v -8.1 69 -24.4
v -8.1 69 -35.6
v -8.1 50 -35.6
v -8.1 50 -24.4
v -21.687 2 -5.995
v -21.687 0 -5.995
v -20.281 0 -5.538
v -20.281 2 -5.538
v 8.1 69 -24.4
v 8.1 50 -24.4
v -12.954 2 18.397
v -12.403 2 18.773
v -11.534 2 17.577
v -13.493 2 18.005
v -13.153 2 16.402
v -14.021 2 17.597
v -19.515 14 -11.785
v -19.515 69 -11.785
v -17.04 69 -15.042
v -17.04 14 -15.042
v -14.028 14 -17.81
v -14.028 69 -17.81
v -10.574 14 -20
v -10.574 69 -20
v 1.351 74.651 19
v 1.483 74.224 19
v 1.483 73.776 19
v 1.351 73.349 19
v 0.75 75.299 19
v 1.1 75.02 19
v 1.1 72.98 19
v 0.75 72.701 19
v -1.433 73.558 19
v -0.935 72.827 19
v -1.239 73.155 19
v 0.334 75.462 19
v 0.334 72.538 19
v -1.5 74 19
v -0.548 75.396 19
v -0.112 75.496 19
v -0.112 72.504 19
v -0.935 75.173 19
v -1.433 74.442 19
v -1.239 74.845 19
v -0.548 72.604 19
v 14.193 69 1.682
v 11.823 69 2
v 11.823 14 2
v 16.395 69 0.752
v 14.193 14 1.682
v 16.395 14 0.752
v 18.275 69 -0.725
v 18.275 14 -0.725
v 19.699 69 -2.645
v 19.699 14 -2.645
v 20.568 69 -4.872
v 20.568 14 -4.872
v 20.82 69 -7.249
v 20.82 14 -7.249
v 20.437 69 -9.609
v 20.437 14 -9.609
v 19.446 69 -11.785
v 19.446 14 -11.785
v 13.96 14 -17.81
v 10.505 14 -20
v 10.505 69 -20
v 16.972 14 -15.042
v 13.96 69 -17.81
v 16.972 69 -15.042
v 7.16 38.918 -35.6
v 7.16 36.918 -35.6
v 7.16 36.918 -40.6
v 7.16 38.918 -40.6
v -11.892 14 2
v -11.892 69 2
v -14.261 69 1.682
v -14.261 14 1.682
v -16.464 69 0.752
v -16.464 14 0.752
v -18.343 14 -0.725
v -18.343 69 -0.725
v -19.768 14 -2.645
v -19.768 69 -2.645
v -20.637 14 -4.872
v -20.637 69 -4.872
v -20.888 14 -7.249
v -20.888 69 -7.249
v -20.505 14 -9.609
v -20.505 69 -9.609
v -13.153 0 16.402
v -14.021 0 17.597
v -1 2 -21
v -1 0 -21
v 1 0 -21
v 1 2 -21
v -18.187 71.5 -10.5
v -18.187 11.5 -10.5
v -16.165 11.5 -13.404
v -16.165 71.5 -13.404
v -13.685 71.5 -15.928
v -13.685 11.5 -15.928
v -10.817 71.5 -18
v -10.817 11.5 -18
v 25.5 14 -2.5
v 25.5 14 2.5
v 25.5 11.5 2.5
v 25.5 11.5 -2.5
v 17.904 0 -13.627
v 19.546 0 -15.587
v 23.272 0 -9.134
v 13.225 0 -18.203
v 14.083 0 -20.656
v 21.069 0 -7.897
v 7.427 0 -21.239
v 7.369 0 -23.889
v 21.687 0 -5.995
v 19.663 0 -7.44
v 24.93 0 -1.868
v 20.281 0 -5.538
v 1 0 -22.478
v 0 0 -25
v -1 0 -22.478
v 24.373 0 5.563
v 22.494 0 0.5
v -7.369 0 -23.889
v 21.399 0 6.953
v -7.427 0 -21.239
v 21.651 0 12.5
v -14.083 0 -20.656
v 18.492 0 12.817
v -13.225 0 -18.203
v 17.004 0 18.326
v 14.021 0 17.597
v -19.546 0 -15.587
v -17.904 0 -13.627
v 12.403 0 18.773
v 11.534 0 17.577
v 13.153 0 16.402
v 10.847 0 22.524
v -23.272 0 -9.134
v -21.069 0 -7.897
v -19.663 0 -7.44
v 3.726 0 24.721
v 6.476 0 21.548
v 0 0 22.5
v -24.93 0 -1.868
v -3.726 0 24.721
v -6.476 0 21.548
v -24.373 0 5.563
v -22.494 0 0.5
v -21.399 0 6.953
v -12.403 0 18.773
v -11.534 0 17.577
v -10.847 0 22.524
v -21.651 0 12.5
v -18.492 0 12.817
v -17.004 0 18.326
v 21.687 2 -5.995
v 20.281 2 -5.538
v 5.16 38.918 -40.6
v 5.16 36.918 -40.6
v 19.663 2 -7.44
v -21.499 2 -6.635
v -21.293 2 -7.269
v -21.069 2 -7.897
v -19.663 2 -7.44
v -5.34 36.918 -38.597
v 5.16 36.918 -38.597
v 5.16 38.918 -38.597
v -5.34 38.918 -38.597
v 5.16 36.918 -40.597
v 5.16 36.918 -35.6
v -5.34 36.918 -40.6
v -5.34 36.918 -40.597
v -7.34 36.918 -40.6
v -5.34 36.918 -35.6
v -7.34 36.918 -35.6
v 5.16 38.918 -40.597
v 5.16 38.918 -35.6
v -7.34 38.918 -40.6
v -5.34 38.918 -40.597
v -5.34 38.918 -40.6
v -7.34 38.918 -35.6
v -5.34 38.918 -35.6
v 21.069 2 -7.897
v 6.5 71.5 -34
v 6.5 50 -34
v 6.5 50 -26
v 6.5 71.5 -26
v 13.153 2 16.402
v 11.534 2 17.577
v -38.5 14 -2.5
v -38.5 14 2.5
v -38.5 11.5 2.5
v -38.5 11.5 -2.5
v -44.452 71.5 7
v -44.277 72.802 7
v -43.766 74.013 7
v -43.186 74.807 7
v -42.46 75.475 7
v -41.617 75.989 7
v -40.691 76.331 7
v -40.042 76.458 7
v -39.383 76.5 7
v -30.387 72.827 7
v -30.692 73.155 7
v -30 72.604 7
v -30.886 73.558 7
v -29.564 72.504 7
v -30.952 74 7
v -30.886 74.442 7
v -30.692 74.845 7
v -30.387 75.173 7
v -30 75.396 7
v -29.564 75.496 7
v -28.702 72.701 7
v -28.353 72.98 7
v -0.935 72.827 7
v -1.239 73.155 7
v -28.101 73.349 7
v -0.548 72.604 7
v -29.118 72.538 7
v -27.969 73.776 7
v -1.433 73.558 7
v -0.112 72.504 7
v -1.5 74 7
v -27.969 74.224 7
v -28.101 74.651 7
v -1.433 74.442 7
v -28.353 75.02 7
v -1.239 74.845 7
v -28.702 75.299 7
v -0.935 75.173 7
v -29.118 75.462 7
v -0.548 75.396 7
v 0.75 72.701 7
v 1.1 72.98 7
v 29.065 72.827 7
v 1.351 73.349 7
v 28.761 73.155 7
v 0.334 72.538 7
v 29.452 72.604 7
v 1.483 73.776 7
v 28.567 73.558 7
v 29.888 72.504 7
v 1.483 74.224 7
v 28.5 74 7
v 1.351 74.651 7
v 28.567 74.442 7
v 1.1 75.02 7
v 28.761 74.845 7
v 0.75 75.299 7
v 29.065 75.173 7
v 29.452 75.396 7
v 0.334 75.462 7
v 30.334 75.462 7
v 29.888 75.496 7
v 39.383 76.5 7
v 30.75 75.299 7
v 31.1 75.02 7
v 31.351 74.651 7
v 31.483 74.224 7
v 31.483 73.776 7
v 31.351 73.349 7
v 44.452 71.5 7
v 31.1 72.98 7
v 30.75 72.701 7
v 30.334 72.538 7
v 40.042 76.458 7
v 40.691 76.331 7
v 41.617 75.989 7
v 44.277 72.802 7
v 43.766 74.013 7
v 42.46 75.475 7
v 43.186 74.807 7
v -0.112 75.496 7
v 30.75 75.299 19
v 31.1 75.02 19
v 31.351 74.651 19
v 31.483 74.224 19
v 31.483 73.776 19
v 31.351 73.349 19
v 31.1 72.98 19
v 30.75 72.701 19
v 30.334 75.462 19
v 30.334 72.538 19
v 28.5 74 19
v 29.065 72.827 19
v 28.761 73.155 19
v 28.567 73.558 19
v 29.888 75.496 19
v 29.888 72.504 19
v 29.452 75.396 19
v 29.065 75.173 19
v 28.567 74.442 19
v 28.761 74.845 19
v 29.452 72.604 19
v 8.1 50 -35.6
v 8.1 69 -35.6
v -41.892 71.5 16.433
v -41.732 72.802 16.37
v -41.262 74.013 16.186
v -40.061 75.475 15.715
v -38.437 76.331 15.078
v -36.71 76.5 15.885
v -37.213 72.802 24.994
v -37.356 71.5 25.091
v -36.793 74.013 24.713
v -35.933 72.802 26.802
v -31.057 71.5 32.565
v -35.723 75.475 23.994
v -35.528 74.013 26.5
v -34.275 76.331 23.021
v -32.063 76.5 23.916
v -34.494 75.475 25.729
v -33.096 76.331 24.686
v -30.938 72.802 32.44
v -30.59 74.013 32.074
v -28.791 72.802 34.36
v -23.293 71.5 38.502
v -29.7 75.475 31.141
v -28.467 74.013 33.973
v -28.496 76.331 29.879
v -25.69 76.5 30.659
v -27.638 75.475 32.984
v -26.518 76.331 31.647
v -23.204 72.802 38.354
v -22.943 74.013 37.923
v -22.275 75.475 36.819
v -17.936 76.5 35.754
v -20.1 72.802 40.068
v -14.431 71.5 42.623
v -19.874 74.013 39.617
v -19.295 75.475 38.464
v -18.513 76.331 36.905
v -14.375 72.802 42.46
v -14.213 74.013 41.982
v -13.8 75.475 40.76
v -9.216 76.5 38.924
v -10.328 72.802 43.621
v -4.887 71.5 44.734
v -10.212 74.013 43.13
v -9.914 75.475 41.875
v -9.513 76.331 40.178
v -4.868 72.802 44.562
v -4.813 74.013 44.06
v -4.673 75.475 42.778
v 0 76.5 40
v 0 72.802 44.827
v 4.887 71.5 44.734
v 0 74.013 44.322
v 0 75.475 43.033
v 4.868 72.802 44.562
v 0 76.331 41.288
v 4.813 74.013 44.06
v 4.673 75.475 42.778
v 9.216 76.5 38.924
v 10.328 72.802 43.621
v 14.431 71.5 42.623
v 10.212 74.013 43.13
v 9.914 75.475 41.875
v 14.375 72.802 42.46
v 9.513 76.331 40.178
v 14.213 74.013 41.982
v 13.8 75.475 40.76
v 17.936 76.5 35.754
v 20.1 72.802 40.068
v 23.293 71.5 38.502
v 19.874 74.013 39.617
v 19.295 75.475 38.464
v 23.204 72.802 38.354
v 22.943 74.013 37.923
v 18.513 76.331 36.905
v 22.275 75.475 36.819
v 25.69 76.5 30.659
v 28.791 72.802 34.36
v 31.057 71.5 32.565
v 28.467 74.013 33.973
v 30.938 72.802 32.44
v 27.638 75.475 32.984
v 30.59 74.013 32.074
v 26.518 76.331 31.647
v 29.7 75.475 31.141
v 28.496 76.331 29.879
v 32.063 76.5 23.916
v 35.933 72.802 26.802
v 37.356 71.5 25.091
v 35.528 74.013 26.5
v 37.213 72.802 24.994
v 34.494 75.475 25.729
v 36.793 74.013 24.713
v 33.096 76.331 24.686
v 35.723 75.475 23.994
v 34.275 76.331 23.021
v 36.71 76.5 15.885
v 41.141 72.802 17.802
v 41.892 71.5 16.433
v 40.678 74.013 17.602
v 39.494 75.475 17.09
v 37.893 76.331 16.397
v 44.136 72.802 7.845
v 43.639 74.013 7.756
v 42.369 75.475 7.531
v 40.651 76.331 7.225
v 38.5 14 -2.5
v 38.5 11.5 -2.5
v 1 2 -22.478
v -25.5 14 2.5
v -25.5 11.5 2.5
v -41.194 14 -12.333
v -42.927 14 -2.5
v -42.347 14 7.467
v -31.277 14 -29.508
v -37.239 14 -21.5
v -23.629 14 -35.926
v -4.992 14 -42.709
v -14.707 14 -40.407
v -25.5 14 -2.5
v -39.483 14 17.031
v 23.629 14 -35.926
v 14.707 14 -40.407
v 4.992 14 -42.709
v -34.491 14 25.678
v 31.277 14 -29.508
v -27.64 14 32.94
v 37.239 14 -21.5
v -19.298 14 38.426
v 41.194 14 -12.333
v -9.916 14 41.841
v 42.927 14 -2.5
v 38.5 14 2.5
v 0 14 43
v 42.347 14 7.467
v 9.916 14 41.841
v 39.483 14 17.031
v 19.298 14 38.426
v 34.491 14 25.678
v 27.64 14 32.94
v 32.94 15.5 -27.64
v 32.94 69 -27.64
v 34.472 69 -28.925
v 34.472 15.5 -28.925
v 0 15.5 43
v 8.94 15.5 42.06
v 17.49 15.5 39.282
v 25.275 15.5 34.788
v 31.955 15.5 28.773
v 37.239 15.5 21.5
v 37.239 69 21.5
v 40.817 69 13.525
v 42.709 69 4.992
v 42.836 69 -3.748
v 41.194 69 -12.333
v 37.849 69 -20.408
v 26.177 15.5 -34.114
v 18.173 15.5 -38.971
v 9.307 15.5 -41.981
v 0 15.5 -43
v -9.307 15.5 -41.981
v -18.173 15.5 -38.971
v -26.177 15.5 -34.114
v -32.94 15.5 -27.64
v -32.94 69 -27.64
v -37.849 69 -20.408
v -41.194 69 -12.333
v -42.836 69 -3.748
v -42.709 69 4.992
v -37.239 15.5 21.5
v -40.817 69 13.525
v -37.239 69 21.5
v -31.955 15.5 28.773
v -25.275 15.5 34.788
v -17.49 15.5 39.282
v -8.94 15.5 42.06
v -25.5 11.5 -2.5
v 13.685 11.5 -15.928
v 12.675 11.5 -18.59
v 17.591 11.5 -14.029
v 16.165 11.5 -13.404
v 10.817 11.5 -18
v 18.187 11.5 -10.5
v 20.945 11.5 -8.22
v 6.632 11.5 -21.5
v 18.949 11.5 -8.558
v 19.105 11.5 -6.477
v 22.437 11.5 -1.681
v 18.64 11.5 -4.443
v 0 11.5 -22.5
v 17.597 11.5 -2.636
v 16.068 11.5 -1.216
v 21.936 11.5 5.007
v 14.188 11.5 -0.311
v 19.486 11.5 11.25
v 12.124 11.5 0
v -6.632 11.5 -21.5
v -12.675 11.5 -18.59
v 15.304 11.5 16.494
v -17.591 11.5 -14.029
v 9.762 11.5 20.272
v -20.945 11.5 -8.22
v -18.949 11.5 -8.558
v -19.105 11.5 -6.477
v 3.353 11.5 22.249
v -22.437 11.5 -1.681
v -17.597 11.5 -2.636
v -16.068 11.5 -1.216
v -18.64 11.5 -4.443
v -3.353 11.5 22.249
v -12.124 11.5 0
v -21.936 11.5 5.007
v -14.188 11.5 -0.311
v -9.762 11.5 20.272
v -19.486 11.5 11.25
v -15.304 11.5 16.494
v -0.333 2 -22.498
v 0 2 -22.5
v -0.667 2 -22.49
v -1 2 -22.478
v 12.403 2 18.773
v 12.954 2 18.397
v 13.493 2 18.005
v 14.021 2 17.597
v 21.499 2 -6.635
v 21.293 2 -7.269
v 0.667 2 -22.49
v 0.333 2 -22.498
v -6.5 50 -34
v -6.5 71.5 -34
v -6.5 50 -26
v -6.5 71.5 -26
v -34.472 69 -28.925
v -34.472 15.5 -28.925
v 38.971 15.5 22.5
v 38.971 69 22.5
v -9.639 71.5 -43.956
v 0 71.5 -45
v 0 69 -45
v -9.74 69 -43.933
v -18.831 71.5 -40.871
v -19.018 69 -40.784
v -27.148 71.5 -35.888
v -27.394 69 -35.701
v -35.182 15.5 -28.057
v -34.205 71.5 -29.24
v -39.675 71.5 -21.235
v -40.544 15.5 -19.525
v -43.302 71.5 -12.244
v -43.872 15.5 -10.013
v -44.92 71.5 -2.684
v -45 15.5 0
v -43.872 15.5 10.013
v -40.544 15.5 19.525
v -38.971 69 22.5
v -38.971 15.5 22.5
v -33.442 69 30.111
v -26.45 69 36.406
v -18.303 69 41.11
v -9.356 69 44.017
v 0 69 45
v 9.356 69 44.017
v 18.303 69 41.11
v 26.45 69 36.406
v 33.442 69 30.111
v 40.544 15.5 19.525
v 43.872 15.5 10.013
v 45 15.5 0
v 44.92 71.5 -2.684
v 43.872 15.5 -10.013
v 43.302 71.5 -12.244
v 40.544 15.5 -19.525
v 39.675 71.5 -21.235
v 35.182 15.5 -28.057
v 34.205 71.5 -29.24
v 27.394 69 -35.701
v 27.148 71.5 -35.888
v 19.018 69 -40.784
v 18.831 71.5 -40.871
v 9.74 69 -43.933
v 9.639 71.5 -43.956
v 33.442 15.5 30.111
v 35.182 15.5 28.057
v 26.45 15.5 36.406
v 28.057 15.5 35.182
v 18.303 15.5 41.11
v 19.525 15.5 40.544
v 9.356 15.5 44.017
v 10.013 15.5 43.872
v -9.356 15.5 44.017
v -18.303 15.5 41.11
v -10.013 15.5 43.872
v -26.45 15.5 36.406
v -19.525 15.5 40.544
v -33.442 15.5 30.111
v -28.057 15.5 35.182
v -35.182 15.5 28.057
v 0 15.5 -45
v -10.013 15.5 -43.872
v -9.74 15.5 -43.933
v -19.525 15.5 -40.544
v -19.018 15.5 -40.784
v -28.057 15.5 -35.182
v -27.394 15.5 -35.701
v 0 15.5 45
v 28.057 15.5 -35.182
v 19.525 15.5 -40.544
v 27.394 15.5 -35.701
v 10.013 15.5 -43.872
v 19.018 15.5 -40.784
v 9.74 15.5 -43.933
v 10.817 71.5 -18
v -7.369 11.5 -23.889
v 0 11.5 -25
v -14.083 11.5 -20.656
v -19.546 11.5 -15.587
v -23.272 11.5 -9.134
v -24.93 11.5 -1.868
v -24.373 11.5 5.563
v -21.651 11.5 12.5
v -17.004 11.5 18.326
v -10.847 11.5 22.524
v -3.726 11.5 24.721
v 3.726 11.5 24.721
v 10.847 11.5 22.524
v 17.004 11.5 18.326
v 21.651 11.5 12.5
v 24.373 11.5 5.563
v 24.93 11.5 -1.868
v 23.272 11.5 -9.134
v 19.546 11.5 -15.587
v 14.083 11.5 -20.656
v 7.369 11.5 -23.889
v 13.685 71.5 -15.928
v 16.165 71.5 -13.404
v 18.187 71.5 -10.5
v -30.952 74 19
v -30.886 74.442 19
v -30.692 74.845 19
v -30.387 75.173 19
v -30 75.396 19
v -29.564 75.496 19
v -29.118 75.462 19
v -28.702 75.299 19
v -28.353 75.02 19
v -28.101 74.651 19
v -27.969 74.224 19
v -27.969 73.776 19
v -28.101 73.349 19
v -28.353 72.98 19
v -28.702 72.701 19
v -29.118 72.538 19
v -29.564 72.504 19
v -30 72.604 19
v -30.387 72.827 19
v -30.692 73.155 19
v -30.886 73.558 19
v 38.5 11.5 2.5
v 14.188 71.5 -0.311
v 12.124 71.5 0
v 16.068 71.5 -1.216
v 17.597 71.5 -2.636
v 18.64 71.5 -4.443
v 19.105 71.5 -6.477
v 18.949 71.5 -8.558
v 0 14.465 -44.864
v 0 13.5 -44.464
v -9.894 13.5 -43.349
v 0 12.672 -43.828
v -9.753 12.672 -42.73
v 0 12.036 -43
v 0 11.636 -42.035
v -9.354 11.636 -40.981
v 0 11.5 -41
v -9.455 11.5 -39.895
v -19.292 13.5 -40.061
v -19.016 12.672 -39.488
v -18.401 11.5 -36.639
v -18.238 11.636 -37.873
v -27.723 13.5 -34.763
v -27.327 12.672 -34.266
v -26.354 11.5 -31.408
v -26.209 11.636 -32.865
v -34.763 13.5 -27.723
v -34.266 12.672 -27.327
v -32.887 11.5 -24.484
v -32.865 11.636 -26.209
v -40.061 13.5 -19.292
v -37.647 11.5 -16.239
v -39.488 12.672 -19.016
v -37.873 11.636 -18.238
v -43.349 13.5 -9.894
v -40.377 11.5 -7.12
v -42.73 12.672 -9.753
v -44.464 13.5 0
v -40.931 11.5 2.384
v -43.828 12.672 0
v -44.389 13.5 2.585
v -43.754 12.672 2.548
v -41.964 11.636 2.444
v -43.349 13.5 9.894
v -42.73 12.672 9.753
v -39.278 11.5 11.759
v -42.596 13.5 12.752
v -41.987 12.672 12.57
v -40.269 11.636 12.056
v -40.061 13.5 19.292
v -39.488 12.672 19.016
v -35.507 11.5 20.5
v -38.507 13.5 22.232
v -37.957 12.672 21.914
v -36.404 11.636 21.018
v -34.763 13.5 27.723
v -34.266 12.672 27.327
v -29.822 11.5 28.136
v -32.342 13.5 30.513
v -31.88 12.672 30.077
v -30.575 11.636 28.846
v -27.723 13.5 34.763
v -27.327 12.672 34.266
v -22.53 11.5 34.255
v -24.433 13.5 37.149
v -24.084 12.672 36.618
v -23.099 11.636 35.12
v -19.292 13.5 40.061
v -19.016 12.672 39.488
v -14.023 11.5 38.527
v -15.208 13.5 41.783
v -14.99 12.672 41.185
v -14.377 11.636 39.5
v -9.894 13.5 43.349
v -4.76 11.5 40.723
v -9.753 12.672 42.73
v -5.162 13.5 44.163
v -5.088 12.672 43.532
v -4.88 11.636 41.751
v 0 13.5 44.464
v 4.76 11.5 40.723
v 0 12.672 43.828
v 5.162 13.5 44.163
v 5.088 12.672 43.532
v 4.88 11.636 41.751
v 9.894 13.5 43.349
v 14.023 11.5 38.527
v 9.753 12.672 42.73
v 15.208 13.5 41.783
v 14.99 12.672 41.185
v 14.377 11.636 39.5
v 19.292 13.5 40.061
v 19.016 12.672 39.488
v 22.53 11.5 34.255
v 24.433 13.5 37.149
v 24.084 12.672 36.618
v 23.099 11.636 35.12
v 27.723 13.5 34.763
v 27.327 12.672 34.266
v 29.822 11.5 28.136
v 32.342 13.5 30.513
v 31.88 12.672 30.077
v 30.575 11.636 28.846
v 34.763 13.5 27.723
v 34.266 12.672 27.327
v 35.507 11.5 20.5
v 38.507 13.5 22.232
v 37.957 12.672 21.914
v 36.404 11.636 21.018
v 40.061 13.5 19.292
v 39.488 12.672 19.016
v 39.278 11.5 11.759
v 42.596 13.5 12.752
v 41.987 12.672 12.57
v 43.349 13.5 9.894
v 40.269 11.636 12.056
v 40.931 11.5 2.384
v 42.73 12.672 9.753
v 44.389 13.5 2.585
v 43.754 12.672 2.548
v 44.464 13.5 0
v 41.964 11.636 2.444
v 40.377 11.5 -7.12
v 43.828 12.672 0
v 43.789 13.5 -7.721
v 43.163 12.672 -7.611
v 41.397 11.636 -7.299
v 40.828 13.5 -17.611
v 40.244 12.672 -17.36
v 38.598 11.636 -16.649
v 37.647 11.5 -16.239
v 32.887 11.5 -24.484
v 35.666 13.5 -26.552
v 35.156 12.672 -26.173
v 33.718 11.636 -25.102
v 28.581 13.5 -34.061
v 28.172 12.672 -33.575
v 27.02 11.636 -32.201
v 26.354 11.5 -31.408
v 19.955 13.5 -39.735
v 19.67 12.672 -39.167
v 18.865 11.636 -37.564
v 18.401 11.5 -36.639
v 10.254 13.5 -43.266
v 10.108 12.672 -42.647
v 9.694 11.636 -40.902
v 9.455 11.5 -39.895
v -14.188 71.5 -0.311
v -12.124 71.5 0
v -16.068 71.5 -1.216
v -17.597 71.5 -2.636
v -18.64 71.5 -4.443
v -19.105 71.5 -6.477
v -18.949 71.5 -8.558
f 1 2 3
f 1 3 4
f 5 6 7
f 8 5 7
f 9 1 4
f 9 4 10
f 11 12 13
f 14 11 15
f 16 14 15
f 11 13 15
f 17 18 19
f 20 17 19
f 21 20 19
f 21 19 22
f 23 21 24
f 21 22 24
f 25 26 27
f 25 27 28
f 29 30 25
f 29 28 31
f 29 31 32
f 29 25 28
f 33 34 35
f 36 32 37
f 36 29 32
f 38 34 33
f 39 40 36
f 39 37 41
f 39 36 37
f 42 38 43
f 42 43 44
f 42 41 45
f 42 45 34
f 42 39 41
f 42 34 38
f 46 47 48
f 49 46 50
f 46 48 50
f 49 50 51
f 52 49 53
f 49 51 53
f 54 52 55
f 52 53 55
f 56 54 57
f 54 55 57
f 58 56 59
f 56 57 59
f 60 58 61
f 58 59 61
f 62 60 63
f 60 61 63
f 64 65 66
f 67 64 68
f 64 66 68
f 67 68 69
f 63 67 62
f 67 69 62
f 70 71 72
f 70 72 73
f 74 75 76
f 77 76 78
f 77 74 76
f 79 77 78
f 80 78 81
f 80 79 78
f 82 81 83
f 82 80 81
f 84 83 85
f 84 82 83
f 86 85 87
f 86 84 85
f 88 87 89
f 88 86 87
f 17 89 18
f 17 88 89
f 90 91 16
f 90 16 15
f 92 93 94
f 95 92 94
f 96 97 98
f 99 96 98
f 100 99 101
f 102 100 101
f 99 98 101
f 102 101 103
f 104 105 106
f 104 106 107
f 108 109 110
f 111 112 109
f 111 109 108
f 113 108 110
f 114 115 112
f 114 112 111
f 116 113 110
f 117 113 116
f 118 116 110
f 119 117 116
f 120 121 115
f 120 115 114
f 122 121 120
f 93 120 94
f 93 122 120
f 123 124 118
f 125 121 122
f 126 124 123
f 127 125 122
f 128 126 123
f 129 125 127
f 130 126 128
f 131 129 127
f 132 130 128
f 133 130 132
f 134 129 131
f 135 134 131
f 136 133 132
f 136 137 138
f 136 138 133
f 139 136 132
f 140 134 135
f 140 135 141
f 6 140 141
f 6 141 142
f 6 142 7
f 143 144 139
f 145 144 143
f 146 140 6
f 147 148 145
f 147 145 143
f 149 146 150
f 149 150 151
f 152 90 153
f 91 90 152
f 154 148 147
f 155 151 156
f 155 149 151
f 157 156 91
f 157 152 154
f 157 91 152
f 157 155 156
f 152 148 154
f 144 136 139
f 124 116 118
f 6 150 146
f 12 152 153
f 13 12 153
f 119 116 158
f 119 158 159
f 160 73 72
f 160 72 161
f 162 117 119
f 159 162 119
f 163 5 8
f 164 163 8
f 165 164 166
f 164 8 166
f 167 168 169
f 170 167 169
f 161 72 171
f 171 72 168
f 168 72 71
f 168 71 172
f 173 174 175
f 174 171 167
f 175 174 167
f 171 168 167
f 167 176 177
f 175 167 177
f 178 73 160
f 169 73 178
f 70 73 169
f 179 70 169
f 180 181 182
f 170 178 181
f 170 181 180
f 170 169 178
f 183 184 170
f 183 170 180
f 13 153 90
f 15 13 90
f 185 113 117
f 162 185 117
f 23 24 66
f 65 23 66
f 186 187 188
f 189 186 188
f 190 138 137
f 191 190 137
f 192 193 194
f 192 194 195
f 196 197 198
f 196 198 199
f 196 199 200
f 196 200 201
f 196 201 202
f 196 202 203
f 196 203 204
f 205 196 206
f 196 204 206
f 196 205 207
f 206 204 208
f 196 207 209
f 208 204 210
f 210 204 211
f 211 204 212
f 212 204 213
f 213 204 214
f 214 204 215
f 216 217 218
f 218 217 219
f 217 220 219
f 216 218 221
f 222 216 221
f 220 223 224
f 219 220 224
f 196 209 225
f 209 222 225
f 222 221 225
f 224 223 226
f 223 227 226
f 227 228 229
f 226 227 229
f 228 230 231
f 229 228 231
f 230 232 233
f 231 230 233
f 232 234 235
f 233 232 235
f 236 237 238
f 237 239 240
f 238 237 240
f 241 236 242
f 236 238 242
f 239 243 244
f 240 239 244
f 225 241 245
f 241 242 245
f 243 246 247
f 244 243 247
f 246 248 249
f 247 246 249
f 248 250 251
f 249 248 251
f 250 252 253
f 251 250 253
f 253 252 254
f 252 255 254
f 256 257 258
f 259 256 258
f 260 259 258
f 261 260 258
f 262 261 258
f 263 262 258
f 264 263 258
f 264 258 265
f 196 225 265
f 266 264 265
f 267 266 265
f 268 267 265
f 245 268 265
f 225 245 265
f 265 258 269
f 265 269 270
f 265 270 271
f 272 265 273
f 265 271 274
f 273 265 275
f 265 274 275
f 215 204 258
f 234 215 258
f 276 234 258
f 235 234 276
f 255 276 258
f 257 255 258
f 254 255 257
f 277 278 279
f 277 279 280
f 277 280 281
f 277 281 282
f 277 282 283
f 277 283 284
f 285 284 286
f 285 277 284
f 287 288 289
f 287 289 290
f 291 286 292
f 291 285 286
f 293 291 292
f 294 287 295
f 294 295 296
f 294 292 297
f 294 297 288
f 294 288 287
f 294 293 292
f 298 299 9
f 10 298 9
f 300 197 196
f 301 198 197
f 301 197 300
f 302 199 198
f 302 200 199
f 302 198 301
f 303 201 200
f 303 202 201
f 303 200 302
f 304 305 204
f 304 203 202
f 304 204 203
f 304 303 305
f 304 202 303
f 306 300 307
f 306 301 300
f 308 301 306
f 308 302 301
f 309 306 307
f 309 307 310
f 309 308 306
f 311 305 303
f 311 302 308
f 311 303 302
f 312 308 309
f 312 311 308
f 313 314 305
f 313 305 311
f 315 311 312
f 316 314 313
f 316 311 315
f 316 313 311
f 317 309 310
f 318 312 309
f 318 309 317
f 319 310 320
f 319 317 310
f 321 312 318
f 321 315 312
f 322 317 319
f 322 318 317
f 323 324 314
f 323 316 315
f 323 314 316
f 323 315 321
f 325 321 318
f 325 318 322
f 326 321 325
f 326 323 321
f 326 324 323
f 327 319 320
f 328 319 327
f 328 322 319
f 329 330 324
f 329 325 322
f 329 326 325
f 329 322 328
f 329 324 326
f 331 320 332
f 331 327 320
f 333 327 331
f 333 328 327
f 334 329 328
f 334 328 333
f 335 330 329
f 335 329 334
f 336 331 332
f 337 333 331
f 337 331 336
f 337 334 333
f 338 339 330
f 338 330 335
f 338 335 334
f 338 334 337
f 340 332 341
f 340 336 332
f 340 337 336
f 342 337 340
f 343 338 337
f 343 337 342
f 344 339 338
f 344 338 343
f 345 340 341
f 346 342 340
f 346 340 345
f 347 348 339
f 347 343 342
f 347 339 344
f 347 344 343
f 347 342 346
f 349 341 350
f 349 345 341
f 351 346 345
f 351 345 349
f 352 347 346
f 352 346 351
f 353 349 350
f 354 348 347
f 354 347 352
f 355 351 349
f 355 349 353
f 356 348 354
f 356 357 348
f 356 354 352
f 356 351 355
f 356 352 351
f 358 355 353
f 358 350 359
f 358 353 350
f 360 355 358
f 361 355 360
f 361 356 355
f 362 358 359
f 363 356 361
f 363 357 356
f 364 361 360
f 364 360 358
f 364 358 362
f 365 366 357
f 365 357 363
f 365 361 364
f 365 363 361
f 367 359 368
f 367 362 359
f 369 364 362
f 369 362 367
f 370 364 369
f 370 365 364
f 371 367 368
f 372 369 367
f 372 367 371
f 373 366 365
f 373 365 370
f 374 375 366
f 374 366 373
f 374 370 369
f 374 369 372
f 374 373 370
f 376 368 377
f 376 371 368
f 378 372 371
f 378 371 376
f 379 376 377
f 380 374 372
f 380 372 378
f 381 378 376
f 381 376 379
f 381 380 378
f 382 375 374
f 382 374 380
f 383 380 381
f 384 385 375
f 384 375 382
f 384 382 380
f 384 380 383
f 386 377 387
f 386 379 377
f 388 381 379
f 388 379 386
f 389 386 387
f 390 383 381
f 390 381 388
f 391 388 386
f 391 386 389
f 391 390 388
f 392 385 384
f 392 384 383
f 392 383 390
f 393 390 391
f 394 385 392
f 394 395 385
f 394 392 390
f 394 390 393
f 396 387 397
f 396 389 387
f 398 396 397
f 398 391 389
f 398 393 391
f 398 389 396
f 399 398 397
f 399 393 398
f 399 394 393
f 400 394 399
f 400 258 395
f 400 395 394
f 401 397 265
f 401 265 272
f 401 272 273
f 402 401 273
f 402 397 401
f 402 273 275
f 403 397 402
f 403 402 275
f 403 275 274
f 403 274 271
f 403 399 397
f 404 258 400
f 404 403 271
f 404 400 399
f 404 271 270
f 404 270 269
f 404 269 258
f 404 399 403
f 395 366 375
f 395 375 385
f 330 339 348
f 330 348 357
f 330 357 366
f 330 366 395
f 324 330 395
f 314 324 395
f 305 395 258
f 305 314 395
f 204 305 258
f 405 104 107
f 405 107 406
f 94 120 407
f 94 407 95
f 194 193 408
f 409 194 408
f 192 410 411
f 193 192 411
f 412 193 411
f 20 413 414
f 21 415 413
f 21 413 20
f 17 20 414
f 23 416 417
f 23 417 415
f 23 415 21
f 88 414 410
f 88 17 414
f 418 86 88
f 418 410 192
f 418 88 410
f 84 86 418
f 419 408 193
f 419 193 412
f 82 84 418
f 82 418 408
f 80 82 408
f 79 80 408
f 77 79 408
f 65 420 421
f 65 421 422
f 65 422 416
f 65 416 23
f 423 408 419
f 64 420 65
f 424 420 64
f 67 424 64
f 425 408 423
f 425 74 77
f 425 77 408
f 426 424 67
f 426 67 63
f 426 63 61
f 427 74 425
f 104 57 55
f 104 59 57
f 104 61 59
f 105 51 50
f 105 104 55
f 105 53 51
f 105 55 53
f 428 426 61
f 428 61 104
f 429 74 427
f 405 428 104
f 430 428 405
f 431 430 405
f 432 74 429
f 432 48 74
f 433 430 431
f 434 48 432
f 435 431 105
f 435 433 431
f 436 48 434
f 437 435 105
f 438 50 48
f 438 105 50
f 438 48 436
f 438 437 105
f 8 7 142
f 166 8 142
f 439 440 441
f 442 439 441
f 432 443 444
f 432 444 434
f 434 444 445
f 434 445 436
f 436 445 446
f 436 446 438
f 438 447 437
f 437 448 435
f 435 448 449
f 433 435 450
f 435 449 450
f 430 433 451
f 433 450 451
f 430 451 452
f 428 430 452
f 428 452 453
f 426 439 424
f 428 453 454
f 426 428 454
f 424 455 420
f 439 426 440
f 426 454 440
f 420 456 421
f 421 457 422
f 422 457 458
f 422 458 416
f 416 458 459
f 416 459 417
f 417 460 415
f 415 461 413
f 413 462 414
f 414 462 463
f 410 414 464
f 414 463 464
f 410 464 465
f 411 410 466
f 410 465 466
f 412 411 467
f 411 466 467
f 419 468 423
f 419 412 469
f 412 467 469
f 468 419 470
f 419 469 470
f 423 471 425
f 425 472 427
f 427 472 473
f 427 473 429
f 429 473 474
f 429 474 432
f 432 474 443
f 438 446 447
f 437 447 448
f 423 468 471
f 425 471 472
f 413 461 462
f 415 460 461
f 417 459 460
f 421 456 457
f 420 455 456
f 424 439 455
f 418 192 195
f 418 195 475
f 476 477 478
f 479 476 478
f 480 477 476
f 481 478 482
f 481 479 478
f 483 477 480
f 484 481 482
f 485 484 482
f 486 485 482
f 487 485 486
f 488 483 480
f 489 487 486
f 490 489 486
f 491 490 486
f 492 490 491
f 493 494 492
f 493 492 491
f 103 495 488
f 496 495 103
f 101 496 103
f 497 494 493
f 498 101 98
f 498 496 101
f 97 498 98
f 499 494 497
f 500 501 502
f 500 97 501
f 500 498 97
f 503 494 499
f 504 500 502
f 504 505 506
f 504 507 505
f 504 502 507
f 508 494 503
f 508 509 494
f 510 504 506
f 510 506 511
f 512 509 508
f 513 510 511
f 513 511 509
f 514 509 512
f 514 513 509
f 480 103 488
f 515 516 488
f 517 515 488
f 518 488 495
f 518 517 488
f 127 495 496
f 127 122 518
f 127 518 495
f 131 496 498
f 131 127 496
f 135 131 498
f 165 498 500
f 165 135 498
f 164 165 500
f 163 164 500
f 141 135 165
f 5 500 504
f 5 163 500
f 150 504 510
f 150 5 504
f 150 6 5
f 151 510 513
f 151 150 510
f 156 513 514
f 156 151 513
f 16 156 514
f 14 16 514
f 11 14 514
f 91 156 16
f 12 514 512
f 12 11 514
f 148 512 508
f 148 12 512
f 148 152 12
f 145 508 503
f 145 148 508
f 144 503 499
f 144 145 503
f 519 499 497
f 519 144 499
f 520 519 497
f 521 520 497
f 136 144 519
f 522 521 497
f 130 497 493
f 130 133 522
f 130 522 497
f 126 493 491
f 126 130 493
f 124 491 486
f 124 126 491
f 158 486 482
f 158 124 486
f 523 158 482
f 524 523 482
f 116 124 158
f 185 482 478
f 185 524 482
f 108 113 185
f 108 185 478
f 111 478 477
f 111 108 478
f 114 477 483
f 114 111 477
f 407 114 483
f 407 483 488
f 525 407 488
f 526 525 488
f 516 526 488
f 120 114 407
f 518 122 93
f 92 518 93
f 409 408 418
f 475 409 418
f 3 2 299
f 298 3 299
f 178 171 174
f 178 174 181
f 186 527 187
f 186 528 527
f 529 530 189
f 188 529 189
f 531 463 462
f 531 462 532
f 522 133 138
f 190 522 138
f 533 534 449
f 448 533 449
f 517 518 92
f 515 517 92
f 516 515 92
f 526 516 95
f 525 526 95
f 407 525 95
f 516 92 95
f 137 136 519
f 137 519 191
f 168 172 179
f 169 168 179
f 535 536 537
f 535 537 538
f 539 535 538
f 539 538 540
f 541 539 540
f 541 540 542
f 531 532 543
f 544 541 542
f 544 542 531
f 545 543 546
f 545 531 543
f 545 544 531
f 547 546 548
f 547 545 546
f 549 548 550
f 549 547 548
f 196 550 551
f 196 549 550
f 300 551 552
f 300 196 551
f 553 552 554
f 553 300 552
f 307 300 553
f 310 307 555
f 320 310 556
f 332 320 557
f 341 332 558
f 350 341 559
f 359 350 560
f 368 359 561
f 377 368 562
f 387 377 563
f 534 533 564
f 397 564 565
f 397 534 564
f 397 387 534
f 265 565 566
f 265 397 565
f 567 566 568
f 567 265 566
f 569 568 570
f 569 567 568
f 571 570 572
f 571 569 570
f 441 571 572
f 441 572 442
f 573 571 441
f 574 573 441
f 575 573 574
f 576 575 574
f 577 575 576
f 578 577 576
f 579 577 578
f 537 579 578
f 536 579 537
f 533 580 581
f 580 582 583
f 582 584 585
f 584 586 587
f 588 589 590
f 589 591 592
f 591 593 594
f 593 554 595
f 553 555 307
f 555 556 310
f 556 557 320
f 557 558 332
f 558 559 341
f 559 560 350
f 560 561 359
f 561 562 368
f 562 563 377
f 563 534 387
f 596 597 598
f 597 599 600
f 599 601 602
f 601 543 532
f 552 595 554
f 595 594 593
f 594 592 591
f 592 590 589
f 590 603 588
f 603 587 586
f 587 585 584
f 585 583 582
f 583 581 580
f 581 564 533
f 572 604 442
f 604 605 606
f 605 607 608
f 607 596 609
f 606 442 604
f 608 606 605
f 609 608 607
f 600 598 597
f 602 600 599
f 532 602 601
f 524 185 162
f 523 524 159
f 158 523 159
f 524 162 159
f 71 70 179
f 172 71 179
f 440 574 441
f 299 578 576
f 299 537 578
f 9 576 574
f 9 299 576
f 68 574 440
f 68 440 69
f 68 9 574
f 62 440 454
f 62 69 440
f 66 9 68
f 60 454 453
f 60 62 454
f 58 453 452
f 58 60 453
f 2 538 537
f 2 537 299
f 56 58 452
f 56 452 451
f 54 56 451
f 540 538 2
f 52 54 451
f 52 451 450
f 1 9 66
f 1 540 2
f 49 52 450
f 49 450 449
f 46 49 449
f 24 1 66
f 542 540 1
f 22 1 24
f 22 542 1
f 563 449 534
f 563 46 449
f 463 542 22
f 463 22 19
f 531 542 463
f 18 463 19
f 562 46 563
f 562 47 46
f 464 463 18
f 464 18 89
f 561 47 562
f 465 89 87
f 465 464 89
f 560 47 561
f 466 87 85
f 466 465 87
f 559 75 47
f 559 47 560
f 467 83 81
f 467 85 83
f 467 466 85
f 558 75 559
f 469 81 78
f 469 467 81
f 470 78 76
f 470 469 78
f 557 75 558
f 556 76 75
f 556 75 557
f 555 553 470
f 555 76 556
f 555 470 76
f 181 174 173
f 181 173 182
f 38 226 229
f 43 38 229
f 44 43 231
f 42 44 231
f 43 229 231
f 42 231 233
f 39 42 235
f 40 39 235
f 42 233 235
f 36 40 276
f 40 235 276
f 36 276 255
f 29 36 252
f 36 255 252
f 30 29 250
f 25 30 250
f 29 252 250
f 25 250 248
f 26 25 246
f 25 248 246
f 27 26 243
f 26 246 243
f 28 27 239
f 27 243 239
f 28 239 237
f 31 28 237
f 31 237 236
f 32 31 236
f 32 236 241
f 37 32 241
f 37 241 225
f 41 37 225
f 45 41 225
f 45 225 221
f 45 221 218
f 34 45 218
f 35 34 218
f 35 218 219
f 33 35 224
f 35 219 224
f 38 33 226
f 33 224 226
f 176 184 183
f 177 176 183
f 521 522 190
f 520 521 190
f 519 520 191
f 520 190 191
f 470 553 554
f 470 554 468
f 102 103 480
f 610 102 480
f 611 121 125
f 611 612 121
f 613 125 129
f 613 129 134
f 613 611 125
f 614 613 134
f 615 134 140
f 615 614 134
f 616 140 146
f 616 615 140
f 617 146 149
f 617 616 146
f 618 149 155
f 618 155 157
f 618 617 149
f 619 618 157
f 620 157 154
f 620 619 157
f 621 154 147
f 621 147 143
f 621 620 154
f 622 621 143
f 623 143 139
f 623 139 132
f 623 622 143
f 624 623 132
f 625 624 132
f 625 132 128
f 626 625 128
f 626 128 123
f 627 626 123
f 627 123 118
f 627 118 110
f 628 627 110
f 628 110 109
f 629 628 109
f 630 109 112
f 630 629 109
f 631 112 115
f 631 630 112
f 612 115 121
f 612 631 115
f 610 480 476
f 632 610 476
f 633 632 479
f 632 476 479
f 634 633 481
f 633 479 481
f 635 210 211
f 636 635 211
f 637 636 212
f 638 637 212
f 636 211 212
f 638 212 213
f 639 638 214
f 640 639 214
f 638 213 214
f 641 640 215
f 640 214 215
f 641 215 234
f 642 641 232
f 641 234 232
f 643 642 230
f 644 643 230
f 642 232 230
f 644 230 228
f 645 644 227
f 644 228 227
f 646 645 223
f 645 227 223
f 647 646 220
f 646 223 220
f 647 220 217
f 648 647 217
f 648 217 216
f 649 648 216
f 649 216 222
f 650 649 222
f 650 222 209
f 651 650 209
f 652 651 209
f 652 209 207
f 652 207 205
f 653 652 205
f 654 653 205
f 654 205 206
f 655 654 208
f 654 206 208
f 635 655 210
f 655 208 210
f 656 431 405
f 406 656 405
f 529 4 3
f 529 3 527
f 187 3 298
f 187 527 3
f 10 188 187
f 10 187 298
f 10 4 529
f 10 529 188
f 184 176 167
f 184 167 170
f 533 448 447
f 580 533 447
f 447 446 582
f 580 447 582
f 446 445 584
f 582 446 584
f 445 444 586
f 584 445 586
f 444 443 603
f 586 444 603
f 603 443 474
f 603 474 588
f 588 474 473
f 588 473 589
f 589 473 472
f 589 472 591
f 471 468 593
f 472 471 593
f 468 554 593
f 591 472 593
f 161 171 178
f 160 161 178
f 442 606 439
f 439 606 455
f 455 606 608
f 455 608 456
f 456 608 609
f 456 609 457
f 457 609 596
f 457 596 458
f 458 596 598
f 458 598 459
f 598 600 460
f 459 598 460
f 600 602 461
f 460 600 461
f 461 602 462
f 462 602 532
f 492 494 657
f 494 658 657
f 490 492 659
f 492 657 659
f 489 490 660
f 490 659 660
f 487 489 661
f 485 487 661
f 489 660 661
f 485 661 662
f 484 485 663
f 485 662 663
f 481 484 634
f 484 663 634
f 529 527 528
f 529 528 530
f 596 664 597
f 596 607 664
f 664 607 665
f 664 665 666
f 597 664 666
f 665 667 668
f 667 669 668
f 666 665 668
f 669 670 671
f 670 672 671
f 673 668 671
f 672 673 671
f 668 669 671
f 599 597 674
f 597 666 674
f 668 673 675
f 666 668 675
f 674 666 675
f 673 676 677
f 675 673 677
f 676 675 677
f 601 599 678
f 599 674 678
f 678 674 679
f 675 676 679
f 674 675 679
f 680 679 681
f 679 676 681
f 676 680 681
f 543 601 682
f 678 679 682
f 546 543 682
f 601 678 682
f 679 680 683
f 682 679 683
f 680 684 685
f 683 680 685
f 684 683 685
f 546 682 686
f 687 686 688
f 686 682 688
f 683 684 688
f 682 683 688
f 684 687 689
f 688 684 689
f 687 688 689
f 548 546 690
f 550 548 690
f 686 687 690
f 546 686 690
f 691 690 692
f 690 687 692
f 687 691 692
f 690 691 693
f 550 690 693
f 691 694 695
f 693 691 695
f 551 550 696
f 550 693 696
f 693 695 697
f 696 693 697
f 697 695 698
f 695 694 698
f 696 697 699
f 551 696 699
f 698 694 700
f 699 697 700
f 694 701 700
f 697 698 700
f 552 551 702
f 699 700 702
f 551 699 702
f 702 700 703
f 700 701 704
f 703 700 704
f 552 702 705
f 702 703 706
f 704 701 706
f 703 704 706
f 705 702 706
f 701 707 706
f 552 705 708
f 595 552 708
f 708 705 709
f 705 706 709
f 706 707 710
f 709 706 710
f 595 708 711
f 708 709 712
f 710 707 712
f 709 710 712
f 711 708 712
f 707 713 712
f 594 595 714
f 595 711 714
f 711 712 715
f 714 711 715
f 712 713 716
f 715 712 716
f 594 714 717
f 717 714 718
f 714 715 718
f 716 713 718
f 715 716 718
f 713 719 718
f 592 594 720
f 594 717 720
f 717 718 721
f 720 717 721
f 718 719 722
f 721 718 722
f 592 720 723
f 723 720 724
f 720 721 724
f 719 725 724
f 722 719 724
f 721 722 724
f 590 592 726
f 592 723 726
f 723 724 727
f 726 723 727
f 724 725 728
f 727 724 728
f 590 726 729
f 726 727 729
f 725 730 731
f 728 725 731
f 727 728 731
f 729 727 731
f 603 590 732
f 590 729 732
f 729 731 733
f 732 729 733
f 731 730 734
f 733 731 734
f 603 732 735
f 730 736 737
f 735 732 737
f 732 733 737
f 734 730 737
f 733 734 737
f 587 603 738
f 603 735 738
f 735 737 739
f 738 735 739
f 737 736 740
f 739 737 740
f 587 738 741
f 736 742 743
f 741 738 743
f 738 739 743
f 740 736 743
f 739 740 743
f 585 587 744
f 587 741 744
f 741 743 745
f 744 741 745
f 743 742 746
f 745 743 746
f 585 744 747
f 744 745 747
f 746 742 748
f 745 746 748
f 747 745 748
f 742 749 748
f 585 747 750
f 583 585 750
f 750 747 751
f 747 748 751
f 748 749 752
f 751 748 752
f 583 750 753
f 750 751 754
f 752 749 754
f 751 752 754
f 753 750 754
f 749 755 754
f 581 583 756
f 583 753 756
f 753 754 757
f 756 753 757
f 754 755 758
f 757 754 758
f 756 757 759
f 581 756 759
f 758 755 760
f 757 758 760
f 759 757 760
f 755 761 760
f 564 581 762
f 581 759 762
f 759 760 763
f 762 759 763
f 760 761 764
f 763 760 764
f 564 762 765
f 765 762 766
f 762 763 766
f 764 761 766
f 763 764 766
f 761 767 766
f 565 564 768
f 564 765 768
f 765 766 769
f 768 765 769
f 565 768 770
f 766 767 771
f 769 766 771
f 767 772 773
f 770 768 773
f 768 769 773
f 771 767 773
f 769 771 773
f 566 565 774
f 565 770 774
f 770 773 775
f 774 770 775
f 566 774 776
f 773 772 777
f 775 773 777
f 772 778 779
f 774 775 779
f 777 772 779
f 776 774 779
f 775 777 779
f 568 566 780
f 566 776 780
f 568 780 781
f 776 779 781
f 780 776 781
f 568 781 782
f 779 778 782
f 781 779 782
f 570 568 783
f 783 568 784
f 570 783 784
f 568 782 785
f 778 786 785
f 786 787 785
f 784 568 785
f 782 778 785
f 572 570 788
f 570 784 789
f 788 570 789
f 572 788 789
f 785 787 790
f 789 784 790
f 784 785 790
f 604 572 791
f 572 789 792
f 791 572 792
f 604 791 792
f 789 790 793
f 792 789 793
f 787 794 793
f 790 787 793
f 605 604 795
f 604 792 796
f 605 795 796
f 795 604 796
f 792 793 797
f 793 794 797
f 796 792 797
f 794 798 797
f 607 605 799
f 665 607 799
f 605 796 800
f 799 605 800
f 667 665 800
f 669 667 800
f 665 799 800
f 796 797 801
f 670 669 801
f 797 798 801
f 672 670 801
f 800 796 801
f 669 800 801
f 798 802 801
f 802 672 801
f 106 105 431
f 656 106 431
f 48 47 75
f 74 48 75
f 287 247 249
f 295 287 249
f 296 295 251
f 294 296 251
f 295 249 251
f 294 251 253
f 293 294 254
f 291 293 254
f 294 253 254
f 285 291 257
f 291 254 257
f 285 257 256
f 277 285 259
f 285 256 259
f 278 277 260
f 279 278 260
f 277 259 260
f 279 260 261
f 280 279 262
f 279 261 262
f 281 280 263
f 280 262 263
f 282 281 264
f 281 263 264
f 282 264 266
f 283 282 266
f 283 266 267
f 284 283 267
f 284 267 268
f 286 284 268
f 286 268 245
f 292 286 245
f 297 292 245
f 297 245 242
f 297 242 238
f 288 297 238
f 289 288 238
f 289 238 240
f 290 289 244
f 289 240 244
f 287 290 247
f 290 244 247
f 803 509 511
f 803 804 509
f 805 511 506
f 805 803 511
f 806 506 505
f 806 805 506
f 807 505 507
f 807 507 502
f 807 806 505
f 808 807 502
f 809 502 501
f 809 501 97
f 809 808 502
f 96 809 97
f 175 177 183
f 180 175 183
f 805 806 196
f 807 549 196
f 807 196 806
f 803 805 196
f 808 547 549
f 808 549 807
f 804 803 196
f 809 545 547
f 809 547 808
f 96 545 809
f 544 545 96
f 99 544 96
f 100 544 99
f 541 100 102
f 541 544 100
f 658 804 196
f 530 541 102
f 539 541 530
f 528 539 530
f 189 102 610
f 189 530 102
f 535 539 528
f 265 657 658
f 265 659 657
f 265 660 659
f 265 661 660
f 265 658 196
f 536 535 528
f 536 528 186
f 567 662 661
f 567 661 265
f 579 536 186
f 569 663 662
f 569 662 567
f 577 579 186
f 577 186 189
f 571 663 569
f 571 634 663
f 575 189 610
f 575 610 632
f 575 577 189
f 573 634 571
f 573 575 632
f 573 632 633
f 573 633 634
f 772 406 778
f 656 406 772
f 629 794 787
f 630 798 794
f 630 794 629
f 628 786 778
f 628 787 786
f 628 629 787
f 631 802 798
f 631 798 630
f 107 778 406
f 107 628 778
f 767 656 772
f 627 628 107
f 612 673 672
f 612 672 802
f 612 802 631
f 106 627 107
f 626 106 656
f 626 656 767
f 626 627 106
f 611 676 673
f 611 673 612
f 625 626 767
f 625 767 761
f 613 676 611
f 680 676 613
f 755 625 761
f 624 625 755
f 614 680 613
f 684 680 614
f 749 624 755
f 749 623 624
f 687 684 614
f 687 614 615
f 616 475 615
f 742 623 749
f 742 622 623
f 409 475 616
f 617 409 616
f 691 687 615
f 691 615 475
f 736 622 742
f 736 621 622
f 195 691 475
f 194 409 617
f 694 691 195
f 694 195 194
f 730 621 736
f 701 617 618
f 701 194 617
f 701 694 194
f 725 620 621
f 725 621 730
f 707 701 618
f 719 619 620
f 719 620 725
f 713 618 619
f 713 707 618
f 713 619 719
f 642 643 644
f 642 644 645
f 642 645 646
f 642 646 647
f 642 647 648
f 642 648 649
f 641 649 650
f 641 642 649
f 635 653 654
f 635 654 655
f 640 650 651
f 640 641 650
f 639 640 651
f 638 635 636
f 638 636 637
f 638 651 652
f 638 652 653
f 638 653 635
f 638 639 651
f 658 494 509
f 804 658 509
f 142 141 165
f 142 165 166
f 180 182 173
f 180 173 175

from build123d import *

# Parameters (mm, degrees)
CUT_EXTRUDE1_DEPTH           = 5
CUT_EXTRUDE3_DEPTH           = 60
SKETCH8_R                    = 43
CUT_EXTRUDE4_DEPTH           = 55
FILLET1_R                    = 7
SKETCH12_W                   = 6.5
SKETCH12_H                   = 53.5
CUT_REVOLVE1_ANGLE           = 60
CUT_REVOLVE1_OTHER_WAY_ANGLE = 60
SKETCH18_W                   = 13
SKETCH18_H                   = 8
CUT_EXTRUDE13_DEPTH          = 5
SKETCH20_W                   = 100
SKETCH20_H                   = 7
CUT_EXTRUDE15_DEPTH          = 5
SKETCH19_R                   = 1.5
CUT_EXTRUDE14_DEPTH          = 12
FILLET3_R                    = 4
SKETCH24_W                   = 2
SKETCH24_H                   = 3
BOSS_EXTRUDE3_DEPTH          = 2
CIRPATTERN2_COUNT            = 5
SKETCH26_W                   = 5
SKETCH26_H                   = 53.5
CUT_REVOLVE2_ANGLE           = 50
CUT_REVOLVE2_OTHER_WAY_ANGLE = 50
SKETCH29_W                   = 16.2
SKETCH29_H                   = 11.2
SKETCH29_W_2                 = 13
SKETCH29_H_2                 = 8
BOSS_EXTRUDE4_DEPTH          = 19
SKETCH36_W                   = 2
SKETCH36_H                   = 2
BOSS_EXTRUDE7_DEPTH          = 5
SKETCH37_W                   = 2
SKETCH37_H                   = 2
BOSS_EXTRUDE8_DEPTH          = 12.5
SKETCH40_W                   = 2
SKETCH40_H                   = 2
BOSS_EXTRUDE9_DEPTH          = 5
FILLET8_R                    = 9
SKETCH50_W                   = 13
SKETCH50_H                   = 5
CUT_EXTRUDE23_DEPTH          = 7


with BuildPart() as part:
    # Sketch1 → Revolve1 (revolve)
    with BuildSketch(Plane.XY, mode=Mode.PRIVATE) as revolve1_sk:
        with BuildLine():
            Line((0, 76.5), (0, 11.5))
            Line((0, 11.5), (22.5, 11.5))
            Line((22.5, 11.5), (22.5, 0))
            Line((22.5, 0), (25, 0))
            Line((25, 0), (25, 11.5))
            Line((25, 11.5), (45, 11.5))
            Line((45, 11.5), (45, 71.5))
            ThreePointArc((45, 71.5), (43.535533906, 75.035533906), (40, 76.5))
            Line((40, 76.5), (0, 76.5))
        make_face()
    revolve(revolve1_sk.sketch.rotate(Axis((0, 2, 0), (0, 1, 0)), 90), axis=Axis((0, 2, 0), (0, 1, 0)))

    # Sketch5 → Cut-Extrude1 (cut)
    with BuildSketch(Plane(origin=(0, 76.5, 0), x_dir=(1, 0, 0), z_dir=(0, 1, 0))):
        with BuildLine():
            Line((-45, 0), (45, 0))
            ThreePointArc((45, 0), (0, 45), (-45, 0))
        make_face()
    extrude(amount=-CUT_EXTRUDE1_DEPTH, mode=Mode.SUBTRACT)

    # Sketch7 → Cut-Extrude3 (cut)
    with BuildSketch(Plane.XZ.offset(-11.5)):
        with BuildLine():
            Line((21, 0), (-21, 0))
            ThreePointArc((-21, 0), (-18.277714988, -10.340461055), (-10.816653826, -18))
            Line((-10.816653826, -18), (10.816653826, -18))
            ThreePointArc((10.816653826, -18), (18.277714988, -10.340461055), (21, 0))
        make_face()
    extrude(amount=-CUT_EXTRUDE3_DEPTH, mode=Mode.SUBTRACT)

    # Sketch8 → Cut-Extrude4 (cut)
    with BuildSketch(Plane(origin=(0, 69, 0), x_dir=(1, 0, 0), z_dir=(0, 1, 0))):
        with Locations(Location((0, 0, 0), (0, 0, 270))):
            Circle(SKETCH8_R)
        with BuildLine():
            Line((22.912878475, -2), (-22.981606036, -2))
            ThreePointArc((-22.981606036, -2), (-20.067855169, 10.855581536), (-10.573881727, 20))
            Line((-10.573881727, 20), (10.505154166, 20))
            ThreePointArc((10.505154166, 20), (19.999127608, 10.855581536), (22.912878475, -2))
        make_face(mode=Mode.SUBTRACT)
    extrude(amount=-CUT_EXTRUDE4_DEPTH, mode=Mode.SUBTRACT)

    # Fillet1
    fillet1_edges = [part.edges().sort_by_distance(p)[0] for p in [
        (-21, 41.5, 0),
        (21, 41.5, 0),
    ]]
    fillet(fillet1_edges, radius=FILLET1_R)

    # Sketch12 → Cut-Revolve1 (revolve, cut)
    with BuildSketch(Plane(origin=(0, 0, 0), x_dir=(0, 0, -1), z_dir=(1, 0, 0))):
        with Locations((-44.75, 42.25)):
            Rectangle(SKETCH12_W, SKETCH12_H)
    revolve(axis=Axis((0, 71.5, 0), (0, -1, 0)), revolution_arc=CUT_REVOLVE1_ANGLE, mode=Mode.SUBTRACT)

    # Sketch12 → Cut-Revolve1 other way (revolve, cut)
    with BuildSketch(Plane(origin=(0, 0, 0), x_dir=(0, 0, -1), z_dir=(1, 0, 0))):
        with Locations((-44.75, 42.25)):
            Rectangle(SKETCH12_W, SKETCH12_H)
    revolve(axis=Axis((0, 71.5, 0), (0, 1, 0)), revolution_arc=CUT_REVOLVE1_OTHER_WAY_ANGLE, mode=Mode.SUBTRACT)

    # Sketch18 → Cut-Extrude13 (cut)
    with BuildSketch(Plane(origin=(0, 71.5, 0), x_dir=(1, 0, 0), z_dir=(0, 1, 0))):
        with Locations((0, 30)):
            Rectangle(SKETCH18_W, SKETCH18_H)
    extrude(amount=-CUT_EXTRUDE13_DEPTH, mode=Mode.SUBTRACT)

    # Sketch20 → Cut-Extrude15 (cut)
    with BuildSketch(Plane(origin=(0, 76.5, 0), x_dir=(1, 0, 0), z_dir=(0, 1, 0))):
        with Locations((0, -3.5)):
            Rectangle(SKETCH20_W, SKETCH20_H)
    extrude(amount=-CUT_EXTRUDE15_DEPTH, mode=Mode.SUBTRACT)

    # Sketch19 → Cut-Extrude14 (cut)
    with BuildSketch(Plane(origin=(0, 0, 7), x_dir=(-1, 0, 0), z_dir=(0, 0, -1))):
        with Locations((0, 74)):
            Circle(SKETCH19_R)
        with Locations((-30, 74)):
            Circle(SKETCH19_R)
        with Locations((29.452221542, 74)):
            Circle(SKETCH19_R)
    extrude(amount=-CUT_EXTRUDE14_DEPTH, mode=Mode.SUBTRACT)

    # Fillet3
    fillet3_edges = [part.edges().sort_by_distance(p)[0] for p in [
        (0, 11.5, 45),
    ]]
    fillet(fillet3_edges, radius=FILLET3_R - 0.0001)  # a hair under: the kernel refuses the full size

    # Sketch24 → Boss-Extrude3 (add)
    with BuildSketch(Plane.XZ):
        with Locations((0, -22.5)):
            Rectangle(SKETCH24_W, SKETCH24_H)
    boss_extrude3 = extrude(amount=-BOSS_EXTRUDE3_DEPTH)

    # CirPattern2: Boss-Extrude3 ×5 about axis
    cirpattern2_axis = Axis((0, 0, 0), (0, 1, 0))
    for i in range(1, CIRPATTERN2_COUNT):
        add(boss_extrude3.rotate(cirpattern2_axis, i * 360 / CIRPATTERN2_COUNT))

    # Sketch26 → Cut-Revolve2 (revolve, cut)
    with BuildSketch(Plane(origin=(0, 0, 0), x_dir=(0, 0, -1), z_dir=(1, 0, 0))):
        with Locations((45.056943441, 42.25)):
            Rectangle(SKETCH26_W, SKETCH26_H)
    revolve(axis=Axis((0, 2, 0), (0, -1, 0)), revolution_arc=CUT_REVOLVE2_ANGLE, mode=Mode.SUBTRACT)

    # Sketch26 → Cut-Revolve2 other way (revolve, cut)
    with BuildSketch(Plane(origin=(0, 0, 0), x_dir=(0, 0, -1), z_dir=(1, 0, 0))):
        with Locations((45.056943441, 42.25)):
            Rectangle(SKETCH26_W, SKETCH26_H)
    revolve(axis=Axis((0, 2, 0), (0, 1, 0)), revolution_arc=CUT_REVOLVE2_OTHER_WAY_ANGLE, mode=Mode.SUBTRACT)

    # Sketch29 → Boss-Extrude4 (add)
    with BuildSketch(Plane.XZ.offset(-69)):
        with Locations((0, -30)):
            Rectangle(SKETCH29_W, SKETCH29_H)
        with Locations((0, -30)):
            Rectangle(SKETCH29_W_2, SKETCH29_H_2, mode=Mode.SUBTRACT)
    extrude(amount=BOSS_EXTRUDE4_DEPTH)

    # Fillet8
    fillet8_edges = [part.edges().sort_by_distance(p)[0] for p in [
        (-22.981606036, 41.5, 2),
        (22.912878475, 41.5, 2),
    ]]
    fillet(fillet8_edges, radius=FILLET8_R)

    # Sketch50 → Cut-Extrude23 (cut)
    with BuildSketch(Plane(origin=(0, 14, 0), x_dir=(1, 0, 0), z_dir=(0, 1, 0))):
        with Locations((32, 0)):
            Rectangle(SKETCH50_W, SKETCH50_H)
        with Locations((-32, 0)):
            Rectangle(SKETCH50_W, SKETCH50_H)
    extrude(amount=-CUT_EXTRUDE23_DEPTH, mode=Mode.SUBTRACT)


with BuildPart() as body_2:
    # Sketch36 → Boss-Extrude7 (new body)
    with BuildSketch(Plane(origin=(0, 0, -35.6), x_dir=(-1, 0, 0), z_dir=(0, 0, -1))):
        with Locations((-6.159647943, 37.918102195)):
            Rectangle(SKETCH36_W, SKETCH36_H)
    extrude(amount=BOSS_EXTRUDE7_DEPTH)

    # Sketch37 → Boss-Extrude8 (add)
    with BuildSketch(Plane.ZY.offset(-5.159647943)):
        with Locations((-39.597351245, 37.918102195)):
            Rectangle(SKETCH37_W, SKETCH37_H)
    extrude(amount=BOSS_EXTRUDE8_DEPTH)

    # Sketch40 → Boss-Extrude9 (add)
    with BuildSketch(Plane(origin=(0, 0, -35.6), x_dir=(-1, 0, 0), z_dir=(0, 0, -1))):
        with Locations((6.340352057, 37.918102195)):
            Rectangle(SKETCH40_W, SKETCH40_H)
    extrude(amount=BOSS_EXTRUDE9_DEPTH)


solid = Compound([part.part, body_2.part])
